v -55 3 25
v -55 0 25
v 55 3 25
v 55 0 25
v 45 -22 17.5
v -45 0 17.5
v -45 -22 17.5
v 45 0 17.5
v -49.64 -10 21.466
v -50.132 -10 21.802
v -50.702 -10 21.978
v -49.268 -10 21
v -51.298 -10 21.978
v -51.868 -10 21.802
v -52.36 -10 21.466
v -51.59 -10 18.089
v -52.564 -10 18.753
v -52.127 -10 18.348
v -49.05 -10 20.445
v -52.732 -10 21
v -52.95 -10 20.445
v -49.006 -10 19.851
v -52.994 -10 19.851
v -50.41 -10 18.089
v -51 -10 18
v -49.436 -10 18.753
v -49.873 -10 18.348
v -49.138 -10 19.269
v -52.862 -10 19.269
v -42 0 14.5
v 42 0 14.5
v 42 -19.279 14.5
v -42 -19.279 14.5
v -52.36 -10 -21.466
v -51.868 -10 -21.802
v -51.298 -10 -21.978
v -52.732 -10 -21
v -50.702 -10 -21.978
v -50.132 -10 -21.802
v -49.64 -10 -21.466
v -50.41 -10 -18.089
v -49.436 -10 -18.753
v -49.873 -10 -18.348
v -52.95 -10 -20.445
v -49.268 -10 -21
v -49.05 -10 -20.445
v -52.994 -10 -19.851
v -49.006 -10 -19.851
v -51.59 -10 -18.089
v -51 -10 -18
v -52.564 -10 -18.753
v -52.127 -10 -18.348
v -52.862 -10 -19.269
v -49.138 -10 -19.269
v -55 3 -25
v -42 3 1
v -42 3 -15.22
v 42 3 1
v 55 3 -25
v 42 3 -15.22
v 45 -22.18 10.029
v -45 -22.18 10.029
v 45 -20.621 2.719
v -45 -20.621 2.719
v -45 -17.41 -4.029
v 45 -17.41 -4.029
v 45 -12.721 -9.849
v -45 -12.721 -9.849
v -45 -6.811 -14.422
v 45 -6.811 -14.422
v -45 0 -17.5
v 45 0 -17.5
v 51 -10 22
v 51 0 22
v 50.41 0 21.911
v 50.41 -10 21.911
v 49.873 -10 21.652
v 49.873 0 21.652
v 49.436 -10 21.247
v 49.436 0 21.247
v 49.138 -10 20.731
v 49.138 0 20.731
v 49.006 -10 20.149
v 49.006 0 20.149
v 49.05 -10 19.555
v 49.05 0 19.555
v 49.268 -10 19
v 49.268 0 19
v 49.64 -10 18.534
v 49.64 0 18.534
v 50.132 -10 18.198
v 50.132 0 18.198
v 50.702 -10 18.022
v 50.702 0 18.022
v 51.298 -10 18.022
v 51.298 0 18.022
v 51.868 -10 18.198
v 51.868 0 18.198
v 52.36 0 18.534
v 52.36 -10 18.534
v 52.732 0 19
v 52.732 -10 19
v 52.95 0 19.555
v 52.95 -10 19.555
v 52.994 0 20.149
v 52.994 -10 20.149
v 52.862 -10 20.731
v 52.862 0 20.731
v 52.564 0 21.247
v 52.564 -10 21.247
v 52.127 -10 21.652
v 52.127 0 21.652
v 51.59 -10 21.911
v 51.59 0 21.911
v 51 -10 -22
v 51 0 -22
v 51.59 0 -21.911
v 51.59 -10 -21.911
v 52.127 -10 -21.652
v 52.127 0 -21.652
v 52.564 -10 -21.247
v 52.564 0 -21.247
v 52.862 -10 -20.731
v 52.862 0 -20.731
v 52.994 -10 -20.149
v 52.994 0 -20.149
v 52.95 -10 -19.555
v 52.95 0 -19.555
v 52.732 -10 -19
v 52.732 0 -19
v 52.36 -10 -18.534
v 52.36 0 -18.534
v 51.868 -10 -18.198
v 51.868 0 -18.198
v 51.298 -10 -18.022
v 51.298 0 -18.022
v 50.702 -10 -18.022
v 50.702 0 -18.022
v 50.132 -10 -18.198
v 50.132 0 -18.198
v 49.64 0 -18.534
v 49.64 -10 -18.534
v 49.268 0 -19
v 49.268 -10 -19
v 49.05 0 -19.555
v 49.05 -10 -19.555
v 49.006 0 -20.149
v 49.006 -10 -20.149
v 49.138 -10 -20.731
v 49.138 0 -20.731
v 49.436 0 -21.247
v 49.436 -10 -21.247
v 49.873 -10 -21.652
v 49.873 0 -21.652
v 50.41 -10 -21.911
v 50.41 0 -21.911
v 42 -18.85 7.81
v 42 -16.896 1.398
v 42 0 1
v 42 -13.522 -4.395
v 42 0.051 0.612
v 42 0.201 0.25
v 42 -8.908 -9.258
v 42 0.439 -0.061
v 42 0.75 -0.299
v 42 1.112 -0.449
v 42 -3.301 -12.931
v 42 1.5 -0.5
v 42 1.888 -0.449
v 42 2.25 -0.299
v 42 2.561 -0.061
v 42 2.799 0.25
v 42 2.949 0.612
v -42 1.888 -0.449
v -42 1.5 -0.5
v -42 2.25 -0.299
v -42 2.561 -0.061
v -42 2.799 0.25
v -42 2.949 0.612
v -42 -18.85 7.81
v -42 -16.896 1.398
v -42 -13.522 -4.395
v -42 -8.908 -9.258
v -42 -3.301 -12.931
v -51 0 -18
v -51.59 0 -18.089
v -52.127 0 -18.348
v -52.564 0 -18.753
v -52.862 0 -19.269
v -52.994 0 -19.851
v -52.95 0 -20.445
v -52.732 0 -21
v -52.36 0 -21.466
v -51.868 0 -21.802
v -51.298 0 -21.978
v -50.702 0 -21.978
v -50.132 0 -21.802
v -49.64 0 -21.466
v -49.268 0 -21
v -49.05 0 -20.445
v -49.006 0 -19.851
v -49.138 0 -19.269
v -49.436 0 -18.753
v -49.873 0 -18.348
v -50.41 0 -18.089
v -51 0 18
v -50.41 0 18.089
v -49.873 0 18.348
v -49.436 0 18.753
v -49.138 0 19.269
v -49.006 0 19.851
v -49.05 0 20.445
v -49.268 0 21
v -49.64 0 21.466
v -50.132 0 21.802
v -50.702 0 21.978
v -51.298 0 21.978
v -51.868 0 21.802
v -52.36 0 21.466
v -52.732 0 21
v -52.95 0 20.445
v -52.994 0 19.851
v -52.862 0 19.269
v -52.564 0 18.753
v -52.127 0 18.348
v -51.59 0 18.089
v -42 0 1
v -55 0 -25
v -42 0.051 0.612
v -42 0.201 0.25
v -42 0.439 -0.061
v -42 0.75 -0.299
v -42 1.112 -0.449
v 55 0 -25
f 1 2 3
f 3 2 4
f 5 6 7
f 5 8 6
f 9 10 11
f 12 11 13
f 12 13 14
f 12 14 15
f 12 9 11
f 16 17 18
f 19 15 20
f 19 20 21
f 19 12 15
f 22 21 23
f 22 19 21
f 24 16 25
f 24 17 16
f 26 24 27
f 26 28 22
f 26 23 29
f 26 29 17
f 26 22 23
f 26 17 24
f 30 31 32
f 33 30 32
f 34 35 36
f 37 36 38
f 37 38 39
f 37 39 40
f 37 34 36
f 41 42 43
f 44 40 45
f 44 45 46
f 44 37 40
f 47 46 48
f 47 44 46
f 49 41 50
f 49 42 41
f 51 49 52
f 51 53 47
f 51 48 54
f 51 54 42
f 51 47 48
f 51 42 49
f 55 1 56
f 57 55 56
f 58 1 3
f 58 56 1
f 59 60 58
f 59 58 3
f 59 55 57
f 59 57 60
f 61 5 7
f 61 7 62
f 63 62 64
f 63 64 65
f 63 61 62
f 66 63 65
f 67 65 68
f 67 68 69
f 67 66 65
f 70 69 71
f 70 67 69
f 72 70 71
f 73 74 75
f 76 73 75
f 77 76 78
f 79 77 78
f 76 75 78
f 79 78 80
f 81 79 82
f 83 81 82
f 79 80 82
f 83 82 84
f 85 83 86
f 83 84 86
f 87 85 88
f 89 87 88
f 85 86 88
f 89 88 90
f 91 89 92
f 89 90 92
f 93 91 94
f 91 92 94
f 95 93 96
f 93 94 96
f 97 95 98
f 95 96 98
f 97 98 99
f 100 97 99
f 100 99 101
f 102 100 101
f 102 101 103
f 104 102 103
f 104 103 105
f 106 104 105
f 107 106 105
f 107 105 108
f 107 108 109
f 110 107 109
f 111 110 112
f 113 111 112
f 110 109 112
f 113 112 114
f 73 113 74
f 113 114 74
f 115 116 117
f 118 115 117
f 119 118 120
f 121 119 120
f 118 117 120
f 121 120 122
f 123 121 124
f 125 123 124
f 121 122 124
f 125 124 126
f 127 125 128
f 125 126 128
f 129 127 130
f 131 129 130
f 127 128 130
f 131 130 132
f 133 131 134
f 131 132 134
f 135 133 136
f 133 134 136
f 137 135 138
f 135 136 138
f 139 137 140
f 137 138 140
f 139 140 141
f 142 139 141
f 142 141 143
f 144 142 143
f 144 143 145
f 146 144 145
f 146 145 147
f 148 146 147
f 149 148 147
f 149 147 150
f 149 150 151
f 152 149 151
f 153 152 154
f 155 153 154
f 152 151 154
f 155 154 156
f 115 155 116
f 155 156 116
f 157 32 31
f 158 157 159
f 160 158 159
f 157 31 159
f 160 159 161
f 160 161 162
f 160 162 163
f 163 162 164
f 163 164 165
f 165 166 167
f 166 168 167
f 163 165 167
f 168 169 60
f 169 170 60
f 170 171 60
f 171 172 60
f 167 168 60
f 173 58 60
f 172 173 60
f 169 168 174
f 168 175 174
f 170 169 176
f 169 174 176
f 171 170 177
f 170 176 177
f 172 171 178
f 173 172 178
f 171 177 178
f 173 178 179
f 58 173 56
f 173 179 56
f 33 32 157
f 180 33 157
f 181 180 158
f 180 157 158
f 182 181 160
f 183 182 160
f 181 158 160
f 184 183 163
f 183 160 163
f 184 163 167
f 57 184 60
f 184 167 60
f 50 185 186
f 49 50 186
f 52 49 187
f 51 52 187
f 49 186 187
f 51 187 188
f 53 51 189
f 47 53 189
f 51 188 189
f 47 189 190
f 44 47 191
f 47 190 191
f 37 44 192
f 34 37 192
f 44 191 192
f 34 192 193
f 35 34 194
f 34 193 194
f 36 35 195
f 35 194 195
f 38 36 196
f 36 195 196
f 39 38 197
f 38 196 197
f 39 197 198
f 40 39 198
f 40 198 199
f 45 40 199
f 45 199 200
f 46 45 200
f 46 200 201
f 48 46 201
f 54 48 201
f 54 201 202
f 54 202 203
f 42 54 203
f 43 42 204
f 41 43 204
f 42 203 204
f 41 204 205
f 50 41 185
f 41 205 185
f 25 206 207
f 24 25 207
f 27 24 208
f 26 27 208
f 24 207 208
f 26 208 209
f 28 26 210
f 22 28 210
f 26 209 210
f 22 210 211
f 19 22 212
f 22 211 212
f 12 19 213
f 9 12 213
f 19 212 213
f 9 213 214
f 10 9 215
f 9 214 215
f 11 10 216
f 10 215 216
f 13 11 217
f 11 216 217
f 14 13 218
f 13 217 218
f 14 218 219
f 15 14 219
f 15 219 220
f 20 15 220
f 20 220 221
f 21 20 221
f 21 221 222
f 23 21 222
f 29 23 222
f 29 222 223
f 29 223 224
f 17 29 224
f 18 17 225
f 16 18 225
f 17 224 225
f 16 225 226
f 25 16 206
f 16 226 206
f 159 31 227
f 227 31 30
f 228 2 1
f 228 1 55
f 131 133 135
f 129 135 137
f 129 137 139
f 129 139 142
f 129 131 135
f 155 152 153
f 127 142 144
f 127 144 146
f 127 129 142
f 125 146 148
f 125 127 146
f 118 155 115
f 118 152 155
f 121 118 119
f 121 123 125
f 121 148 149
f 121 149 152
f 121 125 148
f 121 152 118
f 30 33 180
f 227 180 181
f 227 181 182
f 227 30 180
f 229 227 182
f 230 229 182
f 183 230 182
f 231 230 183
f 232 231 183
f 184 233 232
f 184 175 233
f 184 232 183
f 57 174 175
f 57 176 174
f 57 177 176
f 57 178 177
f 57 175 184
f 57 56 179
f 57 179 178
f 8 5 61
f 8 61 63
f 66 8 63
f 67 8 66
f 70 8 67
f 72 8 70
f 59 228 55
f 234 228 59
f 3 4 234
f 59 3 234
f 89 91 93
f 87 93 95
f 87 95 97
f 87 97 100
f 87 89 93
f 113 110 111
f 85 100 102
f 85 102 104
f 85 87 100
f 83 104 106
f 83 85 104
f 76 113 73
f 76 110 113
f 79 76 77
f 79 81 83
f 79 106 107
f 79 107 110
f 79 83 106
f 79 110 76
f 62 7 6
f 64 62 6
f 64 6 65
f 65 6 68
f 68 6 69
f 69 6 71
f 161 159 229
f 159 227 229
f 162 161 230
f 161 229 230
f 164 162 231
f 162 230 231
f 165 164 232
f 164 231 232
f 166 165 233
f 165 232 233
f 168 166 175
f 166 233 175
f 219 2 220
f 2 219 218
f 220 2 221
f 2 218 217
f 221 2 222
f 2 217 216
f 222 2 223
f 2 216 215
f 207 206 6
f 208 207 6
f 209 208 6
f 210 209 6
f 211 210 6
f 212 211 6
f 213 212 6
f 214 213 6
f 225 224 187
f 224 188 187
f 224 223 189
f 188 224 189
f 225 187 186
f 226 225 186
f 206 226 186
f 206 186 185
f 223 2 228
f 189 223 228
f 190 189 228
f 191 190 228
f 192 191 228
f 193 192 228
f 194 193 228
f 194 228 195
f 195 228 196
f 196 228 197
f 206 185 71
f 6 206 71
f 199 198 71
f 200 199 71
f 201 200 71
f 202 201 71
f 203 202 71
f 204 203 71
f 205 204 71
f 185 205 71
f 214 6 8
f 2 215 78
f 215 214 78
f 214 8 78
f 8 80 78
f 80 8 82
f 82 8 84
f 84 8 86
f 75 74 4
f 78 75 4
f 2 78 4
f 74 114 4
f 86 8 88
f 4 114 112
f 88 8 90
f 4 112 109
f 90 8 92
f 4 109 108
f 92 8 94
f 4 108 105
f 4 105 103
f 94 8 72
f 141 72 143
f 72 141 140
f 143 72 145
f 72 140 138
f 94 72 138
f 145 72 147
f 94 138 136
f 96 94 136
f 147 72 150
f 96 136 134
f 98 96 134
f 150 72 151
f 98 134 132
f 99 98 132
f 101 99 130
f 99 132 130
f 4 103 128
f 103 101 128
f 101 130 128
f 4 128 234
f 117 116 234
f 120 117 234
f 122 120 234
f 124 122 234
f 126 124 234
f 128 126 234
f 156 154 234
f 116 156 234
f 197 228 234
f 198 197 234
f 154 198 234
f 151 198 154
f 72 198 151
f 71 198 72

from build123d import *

# Parameters (mm, degrees)
SKETCH_1_W          = 110
SKETCH_1_H          = 50
EXTRUDE_1_DEPTH     = 3
EXTRUDE_2_DEPTH     = 45
SKETCH_6_R          = 2
EXTRUDE_986_DEPTH   = 10
CUT_EXTRUDE_1_DEPTH = 42
SKETCH_8_W          = 84
SKETCH_8_H          = 3
EXTRUDE_3_DEPTH     = 15
FILLET_1_R          = 1.5


with BuildPart() as part:
    # 草图1 → 凸台-拉伸1 (new body)
    with BuildSketch(Plane(origin=(0, 0, 0), x_dir=(1, 0, 0), z_dir=(0, 1, 0))):
        Rectangle(SKETCH_1_W, SKETCH_1_H)
    extrude(amount=EXTRUDE_1_DEPTH)

    # 草图2 → 凸台-拉伸2 (add, symmetric)
    with BuildSketch(Plane(origin=(0, 0, 0), x_dir=(0, 0, -1), z_dir=(1, 0, 0))):
        with BuildLine():
            Line((-17.5, 0), (-17.5, -22))
            ThreePointArc((-17.5, -22), (4.029354416, -17.410336571), (17.5, 0))
            Line((17.5, 0), (-17.5, 0))
        make_face()
    extrude(amount=EXTRUDE_2_DEPTH, both=True)

    # 草图6 → Extrude 986 (add)
    with BuildSketch(Plane.XZ):
        with Locations(Location((-51, 20, 0), (0, 0, 270))):
            Circle(SKETCH_6_R)
        with Locations(Location((-51, -20, 0), (0, 0, 90))):
            Circle(SKETCH_6_R)
        with Locations(Location((51, 20, 0), (0, 0, 90))):
            Circle(SKETCH_6_R)
        with Locations(Location((51, -20, 0), (0, 0, 270))):
            Circle(SKETCH_6_R)
    extrude(amount=EXTRUDE_986_DEPTH)

    # 草图7 → 切除-拉伸1 (cut, symmetric)
    with BuildSketch(Plane(origin=(0, 0, 0), x_dir=(0, 0, -1), z_dir=(1, 0, 0))):
        with BuildLine():
            Line((-14.5, 3), (-14.5, -19.279154905))
            ThreePointArc((-14.5, -19.279154905), (4.394615248, -13.521903359), (15.219546663, 3))
            Line((15.219546663, 3), (-14.5, 3))
        make_face()
    extrude(amount=CUT_EXTRUDE_1_DEPTH, both=True, mode=Mode.SUBTRACT)

    # 草图8 → 凸台-拉伸3 (add)
    with BuildSketch(Plane(origin=(0, 0, 14.5), x_dir=(-1, 0, 0), z_dir=(0, 0, -1))):
        with Locations((0, 1.5)):
            Rectangle(SKETCH_8_W, SKETCH_8_H)
    extrude(amount=EXTRUDE_3_DEPTH)

    # 圆角1
    fillet_1_edges = [part.edges().sort_by_distance(p)[0] for p in [
        (0, 0, -0.5),
        (0, 3, -0.5),
    ]]
    fillet(fillet_1_edges, radius=FILLET_1_R - 0.0001)  # a hair under: the kernel refuses the full size


solid = part.part
